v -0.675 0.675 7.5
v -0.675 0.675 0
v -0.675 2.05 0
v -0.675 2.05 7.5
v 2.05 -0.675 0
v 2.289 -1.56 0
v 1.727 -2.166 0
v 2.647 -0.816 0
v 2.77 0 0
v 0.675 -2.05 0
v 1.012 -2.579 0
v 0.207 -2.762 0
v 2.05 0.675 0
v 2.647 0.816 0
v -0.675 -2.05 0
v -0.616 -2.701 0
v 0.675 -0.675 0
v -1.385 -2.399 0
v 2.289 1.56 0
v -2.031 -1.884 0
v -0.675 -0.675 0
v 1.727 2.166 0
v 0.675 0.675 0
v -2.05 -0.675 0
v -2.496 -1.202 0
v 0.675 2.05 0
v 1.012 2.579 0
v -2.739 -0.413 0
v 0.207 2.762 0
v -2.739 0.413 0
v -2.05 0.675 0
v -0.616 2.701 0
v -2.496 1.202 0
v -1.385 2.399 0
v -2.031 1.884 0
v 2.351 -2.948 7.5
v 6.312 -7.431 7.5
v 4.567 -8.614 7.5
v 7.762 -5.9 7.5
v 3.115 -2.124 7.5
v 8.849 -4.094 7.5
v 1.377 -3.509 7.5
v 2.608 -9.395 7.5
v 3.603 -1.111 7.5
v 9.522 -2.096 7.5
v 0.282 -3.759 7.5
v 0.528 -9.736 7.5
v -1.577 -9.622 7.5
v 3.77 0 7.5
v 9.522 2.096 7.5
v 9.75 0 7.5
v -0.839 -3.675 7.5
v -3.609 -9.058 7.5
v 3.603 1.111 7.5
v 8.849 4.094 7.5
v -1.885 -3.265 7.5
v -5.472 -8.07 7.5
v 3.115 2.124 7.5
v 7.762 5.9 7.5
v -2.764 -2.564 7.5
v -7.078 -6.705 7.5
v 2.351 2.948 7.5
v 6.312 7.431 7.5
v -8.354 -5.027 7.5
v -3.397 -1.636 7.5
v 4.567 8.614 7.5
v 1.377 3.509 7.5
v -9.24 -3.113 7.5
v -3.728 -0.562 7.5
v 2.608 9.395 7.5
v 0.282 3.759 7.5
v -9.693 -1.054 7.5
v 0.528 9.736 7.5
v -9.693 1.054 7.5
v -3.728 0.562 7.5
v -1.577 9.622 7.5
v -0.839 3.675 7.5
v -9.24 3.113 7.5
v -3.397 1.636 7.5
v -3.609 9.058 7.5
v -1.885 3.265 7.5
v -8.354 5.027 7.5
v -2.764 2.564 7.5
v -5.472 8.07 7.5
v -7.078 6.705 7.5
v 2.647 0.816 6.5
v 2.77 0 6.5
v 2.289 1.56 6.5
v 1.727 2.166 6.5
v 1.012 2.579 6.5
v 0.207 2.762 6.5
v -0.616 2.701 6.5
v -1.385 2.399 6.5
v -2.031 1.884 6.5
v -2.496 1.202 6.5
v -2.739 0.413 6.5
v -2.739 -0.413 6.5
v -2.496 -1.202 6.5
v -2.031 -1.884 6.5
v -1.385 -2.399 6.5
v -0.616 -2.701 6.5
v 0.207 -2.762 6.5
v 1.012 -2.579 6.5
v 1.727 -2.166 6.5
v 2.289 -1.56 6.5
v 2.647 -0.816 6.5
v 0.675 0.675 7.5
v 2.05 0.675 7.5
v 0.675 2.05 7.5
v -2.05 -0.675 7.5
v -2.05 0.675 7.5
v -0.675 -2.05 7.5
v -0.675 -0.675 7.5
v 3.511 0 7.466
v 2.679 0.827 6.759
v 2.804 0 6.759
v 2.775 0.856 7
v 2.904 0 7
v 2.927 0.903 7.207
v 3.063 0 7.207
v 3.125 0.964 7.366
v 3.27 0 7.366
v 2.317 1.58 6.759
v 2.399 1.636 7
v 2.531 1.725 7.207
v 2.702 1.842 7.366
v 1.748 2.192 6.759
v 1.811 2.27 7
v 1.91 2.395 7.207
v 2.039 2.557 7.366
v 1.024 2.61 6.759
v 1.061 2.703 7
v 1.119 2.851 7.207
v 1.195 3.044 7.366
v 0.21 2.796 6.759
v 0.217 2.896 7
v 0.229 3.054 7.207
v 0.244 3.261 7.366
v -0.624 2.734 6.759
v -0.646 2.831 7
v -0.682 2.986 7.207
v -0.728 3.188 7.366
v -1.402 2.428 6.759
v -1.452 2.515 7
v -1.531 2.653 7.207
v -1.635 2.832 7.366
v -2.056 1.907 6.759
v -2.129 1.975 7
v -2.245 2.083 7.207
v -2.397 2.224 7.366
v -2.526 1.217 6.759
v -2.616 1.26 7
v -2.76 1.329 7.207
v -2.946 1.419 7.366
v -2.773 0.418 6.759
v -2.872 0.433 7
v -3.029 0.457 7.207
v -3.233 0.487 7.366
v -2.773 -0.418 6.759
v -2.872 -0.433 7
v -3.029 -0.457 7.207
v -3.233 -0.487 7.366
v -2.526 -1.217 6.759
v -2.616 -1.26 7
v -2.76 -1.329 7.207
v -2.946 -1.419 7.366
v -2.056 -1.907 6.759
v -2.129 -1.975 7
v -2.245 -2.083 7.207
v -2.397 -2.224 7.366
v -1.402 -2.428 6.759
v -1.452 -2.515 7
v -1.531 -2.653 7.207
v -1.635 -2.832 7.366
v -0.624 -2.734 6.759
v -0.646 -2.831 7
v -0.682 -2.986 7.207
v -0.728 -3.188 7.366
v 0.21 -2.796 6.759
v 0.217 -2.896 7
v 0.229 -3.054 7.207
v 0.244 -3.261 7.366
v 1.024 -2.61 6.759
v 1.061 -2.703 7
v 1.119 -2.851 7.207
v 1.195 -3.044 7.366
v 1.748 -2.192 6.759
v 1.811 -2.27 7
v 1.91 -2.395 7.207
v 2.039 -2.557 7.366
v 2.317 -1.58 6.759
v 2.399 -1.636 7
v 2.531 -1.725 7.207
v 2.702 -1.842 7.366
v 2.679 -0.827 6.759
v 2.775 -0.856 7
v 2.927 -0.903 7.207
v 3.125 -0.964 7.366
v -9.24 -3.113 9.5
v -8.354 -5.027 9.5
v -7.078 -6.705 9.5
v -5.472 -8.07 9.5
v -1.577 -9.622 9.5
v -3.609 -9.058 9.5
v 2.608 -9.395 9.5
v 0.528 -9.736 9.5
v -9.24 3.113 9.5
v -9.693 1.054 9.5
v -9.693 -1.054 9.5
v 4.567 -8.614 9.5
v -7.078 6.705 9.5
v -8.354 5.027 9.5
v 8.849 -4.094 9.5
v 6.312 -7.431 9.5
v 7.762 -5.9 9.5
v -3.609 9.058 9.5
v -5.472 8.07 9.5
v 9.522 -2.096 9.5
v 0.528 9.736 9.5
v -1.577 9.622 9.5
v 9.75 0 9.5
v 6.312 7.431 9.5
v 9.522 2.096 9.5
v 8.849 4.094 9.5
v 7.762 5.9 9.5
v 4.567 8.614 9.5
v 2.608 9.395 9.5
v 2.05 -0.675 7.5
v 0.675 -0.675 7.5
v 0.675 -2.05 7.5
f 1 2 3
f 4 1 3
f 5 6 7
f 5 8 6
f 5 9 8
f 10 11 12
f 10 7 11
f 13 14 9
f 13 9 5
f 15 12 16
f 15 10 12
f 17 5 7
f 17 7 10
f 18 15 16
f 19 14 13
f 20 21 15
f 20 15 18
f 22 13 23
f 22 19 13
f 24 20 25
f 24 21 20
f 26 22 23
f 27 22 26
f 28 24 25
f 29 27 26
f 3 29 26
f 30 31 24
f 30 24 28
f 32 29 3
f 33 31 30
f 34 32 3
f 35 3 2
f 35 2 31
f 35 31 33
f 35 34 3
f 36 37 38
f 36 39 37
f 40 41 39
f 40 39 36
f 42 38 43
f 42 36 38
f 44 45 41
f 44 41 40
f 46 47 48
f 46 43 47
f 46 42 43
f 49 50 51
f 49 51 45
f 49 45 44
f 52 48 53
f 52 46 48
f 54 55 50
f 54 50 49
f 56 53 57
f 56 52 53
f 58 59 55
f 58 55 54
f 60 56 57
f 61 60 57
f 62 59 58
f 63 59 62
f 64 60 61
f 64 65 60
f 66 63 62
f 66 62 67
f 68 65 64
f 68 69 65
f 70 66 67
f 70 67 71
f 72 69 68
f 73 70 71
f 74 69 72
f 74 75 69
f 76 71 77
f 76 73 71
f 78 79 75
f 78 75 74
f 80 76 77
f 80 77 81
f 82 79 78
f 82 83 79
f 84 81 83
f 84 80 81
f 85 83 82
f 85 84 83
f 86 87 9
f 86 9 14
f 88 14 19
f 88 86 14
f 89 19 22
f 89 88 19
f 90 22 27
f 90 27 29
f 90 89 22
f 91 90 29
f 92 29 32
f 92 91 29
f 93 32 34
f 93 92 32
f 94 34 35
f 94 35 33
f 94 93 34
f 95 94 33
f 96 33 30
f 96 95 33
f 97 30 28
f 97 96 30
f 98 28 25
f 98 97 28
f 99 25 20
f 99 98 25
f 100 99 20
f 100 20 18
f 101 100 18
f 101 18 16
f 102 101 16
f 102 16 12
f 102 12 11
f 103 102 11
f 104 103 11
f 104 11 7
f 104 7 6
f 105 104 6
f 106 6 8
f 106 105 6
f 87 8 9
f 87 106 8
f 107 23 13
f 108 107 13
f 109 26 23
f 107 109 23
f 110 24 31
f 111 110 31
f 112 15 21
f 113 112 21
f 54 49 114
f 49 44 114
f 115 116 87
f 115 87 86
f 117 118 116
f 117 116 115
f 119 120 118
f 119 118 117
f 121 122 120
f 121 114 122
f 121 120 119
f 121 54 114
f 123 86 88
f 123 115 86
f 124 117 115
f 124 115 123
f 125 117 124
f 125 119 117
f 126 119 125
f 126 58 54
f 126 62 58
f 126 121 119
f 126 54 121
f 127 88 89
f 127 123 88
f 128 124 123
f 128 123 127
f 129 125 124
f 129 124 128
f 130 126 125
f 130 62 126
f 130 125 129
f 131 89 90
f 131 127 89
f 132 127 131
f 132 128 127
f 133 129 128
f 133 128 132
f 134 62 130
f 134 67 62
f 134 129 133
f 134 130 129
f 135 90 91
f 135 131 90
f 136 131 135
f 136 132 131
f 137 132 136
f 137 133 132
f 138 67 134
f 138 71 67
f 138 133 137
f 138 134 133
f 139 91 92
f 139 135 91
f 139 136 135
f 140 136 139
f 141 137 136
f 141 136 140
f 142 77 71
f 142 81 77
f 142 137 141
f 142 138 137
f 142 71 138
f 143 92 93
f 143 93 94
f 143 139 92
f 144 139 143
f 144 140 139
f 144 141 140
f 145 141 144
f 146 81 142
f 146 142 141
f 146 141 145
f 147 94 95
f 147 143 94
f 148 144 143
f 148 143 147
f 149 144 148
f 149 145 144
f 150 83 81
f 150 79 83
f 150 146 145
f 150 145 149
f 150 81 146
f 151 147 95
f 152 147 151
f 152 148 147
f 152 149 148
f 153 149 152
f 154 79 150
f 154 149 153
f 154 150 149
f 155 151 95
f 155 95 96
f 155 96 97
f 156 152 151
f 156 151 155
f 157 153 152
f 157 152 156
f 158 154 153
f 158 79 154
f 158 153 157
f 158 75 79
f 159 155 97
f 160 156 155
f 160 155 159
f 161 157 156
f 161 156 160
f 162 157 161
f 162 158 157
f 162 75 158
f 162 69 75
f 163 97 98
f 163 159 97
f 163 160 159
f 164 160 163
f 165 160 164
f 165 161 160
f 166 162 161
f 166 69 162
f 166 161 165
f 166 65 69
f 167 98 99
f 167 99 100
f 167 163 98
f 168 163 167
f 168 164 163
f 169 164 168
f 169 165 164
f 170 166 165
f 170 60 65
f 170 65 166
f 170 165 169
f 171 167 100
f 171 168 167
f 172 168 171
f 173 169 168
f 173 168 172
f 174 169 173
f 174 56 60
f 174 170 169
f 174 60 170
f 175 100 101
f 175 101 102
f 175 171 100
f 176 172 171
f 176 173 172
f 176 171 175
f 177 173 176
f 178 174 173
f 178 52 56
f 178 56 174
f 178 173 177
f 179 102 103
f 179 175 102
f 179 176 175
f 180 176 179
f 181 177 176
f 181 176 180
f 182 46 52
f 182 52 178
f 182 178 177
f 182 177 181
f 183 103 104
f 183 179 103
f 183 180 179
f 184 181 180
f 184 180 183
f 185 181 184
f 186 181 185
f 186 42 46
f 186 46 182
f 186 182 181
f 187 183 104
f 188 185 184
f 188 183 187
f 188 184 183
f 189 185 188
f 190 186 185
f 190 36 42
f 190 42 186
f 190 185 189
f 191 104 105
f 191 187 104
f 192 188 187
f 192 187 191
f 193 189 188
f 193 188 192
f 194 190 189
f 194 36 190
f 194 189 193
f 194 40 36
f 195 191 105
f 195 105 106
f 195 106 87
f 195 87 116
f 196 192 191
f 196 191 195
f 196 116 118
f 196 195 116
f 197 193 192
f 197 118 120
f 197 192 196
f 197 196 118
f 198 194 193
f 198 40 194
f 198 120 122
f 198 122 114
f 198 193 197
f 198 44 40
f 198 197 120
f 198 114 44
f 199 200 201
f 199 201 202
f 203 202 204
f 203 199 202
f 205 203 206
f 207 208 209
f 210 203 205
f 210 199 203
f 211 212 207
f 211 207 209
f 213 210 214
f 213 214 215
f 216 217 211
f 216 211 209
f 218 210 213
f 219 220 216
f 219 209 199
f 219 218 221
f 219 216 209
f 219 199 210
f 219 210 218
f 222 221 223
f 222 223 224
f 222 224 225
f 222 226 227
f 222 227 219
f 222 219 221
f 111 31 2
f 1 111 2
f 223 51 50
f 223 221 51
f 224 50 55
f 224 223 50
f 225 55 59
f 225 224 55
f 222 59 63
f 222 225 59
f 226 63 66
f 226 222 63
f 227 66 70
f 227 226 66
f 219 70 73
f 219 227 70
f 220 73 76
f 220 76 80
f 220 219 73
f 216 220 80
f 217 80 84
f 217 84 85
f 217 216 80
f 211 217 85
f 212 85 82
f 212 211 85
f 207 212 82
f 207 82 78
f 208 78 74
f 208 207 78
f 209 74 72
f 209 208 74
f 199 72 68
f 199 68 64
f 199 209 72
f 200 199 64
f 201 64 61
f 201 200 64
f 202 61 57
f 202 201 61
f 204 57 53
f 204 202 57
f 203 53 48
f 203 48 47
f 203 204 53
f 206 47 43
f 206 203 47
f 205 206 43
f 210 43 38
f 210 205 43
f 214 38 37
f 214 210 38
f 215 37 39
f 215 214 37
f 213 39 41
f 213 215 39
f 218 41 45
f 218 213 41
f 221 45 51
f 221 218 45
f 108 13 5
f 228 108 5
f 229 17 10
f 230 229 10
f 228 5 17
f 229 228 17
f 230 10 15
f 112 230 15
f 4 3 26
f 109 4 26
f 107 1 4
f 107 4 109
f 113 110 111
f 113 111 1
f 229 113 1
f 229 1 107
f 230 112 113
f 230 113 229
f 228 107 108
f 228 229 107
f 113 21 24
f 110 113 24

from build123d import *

# Parameters (mm, degrees)
F0_W     = 2.77
F0_H     = 7.5
F3_DEPTH = 7.5
F4_R     = 1


with BuildPart() as f1:
    # F0 (on Front) → F1 (revolve)
    with BuildSketch(Plane.XZ):
        Polygon((0, 9.5), (0, 7.5), (2.77, 7.5), (9.75, 7.5), (9.75, 9.5), align=None)
        with Locations((1.385, 3.75)):
            Rectangle(F0_W, F0_H)
    revolve(axis=Axis((0, 0, 3.75), (0, 0, 1)))

    # F2 (on face) → F3 (cut)
    with BuildSketch(Plane(origin=(0, 0, 0), x_dir=(1, 0, 0), z_dir=(0, 0, -1))):
        Polygon((0.675, 2.05), (-0.675, 2.05), (-0.675, 0.675), (-2.05, 0.675), (-2.05, -0.675), (-0.675, -0.675), (-0.675, -2.05), (0.675, -2.05), (0.675, -0.675), (2.05, -0.675), (2.05, 0.675), (0.675, 0.675), align=None)
    extrude(amount=-F3_DEPTH, mode=Mode.SUBTRACT)

    # F4
    f4_edges = [f1.edges().sort_by_distance(p)[0] for p in [
        (-2.77, 0, 7.5),
    ]]
    fillet(f4_edges, radius=F4_R)


solid = f1.part
